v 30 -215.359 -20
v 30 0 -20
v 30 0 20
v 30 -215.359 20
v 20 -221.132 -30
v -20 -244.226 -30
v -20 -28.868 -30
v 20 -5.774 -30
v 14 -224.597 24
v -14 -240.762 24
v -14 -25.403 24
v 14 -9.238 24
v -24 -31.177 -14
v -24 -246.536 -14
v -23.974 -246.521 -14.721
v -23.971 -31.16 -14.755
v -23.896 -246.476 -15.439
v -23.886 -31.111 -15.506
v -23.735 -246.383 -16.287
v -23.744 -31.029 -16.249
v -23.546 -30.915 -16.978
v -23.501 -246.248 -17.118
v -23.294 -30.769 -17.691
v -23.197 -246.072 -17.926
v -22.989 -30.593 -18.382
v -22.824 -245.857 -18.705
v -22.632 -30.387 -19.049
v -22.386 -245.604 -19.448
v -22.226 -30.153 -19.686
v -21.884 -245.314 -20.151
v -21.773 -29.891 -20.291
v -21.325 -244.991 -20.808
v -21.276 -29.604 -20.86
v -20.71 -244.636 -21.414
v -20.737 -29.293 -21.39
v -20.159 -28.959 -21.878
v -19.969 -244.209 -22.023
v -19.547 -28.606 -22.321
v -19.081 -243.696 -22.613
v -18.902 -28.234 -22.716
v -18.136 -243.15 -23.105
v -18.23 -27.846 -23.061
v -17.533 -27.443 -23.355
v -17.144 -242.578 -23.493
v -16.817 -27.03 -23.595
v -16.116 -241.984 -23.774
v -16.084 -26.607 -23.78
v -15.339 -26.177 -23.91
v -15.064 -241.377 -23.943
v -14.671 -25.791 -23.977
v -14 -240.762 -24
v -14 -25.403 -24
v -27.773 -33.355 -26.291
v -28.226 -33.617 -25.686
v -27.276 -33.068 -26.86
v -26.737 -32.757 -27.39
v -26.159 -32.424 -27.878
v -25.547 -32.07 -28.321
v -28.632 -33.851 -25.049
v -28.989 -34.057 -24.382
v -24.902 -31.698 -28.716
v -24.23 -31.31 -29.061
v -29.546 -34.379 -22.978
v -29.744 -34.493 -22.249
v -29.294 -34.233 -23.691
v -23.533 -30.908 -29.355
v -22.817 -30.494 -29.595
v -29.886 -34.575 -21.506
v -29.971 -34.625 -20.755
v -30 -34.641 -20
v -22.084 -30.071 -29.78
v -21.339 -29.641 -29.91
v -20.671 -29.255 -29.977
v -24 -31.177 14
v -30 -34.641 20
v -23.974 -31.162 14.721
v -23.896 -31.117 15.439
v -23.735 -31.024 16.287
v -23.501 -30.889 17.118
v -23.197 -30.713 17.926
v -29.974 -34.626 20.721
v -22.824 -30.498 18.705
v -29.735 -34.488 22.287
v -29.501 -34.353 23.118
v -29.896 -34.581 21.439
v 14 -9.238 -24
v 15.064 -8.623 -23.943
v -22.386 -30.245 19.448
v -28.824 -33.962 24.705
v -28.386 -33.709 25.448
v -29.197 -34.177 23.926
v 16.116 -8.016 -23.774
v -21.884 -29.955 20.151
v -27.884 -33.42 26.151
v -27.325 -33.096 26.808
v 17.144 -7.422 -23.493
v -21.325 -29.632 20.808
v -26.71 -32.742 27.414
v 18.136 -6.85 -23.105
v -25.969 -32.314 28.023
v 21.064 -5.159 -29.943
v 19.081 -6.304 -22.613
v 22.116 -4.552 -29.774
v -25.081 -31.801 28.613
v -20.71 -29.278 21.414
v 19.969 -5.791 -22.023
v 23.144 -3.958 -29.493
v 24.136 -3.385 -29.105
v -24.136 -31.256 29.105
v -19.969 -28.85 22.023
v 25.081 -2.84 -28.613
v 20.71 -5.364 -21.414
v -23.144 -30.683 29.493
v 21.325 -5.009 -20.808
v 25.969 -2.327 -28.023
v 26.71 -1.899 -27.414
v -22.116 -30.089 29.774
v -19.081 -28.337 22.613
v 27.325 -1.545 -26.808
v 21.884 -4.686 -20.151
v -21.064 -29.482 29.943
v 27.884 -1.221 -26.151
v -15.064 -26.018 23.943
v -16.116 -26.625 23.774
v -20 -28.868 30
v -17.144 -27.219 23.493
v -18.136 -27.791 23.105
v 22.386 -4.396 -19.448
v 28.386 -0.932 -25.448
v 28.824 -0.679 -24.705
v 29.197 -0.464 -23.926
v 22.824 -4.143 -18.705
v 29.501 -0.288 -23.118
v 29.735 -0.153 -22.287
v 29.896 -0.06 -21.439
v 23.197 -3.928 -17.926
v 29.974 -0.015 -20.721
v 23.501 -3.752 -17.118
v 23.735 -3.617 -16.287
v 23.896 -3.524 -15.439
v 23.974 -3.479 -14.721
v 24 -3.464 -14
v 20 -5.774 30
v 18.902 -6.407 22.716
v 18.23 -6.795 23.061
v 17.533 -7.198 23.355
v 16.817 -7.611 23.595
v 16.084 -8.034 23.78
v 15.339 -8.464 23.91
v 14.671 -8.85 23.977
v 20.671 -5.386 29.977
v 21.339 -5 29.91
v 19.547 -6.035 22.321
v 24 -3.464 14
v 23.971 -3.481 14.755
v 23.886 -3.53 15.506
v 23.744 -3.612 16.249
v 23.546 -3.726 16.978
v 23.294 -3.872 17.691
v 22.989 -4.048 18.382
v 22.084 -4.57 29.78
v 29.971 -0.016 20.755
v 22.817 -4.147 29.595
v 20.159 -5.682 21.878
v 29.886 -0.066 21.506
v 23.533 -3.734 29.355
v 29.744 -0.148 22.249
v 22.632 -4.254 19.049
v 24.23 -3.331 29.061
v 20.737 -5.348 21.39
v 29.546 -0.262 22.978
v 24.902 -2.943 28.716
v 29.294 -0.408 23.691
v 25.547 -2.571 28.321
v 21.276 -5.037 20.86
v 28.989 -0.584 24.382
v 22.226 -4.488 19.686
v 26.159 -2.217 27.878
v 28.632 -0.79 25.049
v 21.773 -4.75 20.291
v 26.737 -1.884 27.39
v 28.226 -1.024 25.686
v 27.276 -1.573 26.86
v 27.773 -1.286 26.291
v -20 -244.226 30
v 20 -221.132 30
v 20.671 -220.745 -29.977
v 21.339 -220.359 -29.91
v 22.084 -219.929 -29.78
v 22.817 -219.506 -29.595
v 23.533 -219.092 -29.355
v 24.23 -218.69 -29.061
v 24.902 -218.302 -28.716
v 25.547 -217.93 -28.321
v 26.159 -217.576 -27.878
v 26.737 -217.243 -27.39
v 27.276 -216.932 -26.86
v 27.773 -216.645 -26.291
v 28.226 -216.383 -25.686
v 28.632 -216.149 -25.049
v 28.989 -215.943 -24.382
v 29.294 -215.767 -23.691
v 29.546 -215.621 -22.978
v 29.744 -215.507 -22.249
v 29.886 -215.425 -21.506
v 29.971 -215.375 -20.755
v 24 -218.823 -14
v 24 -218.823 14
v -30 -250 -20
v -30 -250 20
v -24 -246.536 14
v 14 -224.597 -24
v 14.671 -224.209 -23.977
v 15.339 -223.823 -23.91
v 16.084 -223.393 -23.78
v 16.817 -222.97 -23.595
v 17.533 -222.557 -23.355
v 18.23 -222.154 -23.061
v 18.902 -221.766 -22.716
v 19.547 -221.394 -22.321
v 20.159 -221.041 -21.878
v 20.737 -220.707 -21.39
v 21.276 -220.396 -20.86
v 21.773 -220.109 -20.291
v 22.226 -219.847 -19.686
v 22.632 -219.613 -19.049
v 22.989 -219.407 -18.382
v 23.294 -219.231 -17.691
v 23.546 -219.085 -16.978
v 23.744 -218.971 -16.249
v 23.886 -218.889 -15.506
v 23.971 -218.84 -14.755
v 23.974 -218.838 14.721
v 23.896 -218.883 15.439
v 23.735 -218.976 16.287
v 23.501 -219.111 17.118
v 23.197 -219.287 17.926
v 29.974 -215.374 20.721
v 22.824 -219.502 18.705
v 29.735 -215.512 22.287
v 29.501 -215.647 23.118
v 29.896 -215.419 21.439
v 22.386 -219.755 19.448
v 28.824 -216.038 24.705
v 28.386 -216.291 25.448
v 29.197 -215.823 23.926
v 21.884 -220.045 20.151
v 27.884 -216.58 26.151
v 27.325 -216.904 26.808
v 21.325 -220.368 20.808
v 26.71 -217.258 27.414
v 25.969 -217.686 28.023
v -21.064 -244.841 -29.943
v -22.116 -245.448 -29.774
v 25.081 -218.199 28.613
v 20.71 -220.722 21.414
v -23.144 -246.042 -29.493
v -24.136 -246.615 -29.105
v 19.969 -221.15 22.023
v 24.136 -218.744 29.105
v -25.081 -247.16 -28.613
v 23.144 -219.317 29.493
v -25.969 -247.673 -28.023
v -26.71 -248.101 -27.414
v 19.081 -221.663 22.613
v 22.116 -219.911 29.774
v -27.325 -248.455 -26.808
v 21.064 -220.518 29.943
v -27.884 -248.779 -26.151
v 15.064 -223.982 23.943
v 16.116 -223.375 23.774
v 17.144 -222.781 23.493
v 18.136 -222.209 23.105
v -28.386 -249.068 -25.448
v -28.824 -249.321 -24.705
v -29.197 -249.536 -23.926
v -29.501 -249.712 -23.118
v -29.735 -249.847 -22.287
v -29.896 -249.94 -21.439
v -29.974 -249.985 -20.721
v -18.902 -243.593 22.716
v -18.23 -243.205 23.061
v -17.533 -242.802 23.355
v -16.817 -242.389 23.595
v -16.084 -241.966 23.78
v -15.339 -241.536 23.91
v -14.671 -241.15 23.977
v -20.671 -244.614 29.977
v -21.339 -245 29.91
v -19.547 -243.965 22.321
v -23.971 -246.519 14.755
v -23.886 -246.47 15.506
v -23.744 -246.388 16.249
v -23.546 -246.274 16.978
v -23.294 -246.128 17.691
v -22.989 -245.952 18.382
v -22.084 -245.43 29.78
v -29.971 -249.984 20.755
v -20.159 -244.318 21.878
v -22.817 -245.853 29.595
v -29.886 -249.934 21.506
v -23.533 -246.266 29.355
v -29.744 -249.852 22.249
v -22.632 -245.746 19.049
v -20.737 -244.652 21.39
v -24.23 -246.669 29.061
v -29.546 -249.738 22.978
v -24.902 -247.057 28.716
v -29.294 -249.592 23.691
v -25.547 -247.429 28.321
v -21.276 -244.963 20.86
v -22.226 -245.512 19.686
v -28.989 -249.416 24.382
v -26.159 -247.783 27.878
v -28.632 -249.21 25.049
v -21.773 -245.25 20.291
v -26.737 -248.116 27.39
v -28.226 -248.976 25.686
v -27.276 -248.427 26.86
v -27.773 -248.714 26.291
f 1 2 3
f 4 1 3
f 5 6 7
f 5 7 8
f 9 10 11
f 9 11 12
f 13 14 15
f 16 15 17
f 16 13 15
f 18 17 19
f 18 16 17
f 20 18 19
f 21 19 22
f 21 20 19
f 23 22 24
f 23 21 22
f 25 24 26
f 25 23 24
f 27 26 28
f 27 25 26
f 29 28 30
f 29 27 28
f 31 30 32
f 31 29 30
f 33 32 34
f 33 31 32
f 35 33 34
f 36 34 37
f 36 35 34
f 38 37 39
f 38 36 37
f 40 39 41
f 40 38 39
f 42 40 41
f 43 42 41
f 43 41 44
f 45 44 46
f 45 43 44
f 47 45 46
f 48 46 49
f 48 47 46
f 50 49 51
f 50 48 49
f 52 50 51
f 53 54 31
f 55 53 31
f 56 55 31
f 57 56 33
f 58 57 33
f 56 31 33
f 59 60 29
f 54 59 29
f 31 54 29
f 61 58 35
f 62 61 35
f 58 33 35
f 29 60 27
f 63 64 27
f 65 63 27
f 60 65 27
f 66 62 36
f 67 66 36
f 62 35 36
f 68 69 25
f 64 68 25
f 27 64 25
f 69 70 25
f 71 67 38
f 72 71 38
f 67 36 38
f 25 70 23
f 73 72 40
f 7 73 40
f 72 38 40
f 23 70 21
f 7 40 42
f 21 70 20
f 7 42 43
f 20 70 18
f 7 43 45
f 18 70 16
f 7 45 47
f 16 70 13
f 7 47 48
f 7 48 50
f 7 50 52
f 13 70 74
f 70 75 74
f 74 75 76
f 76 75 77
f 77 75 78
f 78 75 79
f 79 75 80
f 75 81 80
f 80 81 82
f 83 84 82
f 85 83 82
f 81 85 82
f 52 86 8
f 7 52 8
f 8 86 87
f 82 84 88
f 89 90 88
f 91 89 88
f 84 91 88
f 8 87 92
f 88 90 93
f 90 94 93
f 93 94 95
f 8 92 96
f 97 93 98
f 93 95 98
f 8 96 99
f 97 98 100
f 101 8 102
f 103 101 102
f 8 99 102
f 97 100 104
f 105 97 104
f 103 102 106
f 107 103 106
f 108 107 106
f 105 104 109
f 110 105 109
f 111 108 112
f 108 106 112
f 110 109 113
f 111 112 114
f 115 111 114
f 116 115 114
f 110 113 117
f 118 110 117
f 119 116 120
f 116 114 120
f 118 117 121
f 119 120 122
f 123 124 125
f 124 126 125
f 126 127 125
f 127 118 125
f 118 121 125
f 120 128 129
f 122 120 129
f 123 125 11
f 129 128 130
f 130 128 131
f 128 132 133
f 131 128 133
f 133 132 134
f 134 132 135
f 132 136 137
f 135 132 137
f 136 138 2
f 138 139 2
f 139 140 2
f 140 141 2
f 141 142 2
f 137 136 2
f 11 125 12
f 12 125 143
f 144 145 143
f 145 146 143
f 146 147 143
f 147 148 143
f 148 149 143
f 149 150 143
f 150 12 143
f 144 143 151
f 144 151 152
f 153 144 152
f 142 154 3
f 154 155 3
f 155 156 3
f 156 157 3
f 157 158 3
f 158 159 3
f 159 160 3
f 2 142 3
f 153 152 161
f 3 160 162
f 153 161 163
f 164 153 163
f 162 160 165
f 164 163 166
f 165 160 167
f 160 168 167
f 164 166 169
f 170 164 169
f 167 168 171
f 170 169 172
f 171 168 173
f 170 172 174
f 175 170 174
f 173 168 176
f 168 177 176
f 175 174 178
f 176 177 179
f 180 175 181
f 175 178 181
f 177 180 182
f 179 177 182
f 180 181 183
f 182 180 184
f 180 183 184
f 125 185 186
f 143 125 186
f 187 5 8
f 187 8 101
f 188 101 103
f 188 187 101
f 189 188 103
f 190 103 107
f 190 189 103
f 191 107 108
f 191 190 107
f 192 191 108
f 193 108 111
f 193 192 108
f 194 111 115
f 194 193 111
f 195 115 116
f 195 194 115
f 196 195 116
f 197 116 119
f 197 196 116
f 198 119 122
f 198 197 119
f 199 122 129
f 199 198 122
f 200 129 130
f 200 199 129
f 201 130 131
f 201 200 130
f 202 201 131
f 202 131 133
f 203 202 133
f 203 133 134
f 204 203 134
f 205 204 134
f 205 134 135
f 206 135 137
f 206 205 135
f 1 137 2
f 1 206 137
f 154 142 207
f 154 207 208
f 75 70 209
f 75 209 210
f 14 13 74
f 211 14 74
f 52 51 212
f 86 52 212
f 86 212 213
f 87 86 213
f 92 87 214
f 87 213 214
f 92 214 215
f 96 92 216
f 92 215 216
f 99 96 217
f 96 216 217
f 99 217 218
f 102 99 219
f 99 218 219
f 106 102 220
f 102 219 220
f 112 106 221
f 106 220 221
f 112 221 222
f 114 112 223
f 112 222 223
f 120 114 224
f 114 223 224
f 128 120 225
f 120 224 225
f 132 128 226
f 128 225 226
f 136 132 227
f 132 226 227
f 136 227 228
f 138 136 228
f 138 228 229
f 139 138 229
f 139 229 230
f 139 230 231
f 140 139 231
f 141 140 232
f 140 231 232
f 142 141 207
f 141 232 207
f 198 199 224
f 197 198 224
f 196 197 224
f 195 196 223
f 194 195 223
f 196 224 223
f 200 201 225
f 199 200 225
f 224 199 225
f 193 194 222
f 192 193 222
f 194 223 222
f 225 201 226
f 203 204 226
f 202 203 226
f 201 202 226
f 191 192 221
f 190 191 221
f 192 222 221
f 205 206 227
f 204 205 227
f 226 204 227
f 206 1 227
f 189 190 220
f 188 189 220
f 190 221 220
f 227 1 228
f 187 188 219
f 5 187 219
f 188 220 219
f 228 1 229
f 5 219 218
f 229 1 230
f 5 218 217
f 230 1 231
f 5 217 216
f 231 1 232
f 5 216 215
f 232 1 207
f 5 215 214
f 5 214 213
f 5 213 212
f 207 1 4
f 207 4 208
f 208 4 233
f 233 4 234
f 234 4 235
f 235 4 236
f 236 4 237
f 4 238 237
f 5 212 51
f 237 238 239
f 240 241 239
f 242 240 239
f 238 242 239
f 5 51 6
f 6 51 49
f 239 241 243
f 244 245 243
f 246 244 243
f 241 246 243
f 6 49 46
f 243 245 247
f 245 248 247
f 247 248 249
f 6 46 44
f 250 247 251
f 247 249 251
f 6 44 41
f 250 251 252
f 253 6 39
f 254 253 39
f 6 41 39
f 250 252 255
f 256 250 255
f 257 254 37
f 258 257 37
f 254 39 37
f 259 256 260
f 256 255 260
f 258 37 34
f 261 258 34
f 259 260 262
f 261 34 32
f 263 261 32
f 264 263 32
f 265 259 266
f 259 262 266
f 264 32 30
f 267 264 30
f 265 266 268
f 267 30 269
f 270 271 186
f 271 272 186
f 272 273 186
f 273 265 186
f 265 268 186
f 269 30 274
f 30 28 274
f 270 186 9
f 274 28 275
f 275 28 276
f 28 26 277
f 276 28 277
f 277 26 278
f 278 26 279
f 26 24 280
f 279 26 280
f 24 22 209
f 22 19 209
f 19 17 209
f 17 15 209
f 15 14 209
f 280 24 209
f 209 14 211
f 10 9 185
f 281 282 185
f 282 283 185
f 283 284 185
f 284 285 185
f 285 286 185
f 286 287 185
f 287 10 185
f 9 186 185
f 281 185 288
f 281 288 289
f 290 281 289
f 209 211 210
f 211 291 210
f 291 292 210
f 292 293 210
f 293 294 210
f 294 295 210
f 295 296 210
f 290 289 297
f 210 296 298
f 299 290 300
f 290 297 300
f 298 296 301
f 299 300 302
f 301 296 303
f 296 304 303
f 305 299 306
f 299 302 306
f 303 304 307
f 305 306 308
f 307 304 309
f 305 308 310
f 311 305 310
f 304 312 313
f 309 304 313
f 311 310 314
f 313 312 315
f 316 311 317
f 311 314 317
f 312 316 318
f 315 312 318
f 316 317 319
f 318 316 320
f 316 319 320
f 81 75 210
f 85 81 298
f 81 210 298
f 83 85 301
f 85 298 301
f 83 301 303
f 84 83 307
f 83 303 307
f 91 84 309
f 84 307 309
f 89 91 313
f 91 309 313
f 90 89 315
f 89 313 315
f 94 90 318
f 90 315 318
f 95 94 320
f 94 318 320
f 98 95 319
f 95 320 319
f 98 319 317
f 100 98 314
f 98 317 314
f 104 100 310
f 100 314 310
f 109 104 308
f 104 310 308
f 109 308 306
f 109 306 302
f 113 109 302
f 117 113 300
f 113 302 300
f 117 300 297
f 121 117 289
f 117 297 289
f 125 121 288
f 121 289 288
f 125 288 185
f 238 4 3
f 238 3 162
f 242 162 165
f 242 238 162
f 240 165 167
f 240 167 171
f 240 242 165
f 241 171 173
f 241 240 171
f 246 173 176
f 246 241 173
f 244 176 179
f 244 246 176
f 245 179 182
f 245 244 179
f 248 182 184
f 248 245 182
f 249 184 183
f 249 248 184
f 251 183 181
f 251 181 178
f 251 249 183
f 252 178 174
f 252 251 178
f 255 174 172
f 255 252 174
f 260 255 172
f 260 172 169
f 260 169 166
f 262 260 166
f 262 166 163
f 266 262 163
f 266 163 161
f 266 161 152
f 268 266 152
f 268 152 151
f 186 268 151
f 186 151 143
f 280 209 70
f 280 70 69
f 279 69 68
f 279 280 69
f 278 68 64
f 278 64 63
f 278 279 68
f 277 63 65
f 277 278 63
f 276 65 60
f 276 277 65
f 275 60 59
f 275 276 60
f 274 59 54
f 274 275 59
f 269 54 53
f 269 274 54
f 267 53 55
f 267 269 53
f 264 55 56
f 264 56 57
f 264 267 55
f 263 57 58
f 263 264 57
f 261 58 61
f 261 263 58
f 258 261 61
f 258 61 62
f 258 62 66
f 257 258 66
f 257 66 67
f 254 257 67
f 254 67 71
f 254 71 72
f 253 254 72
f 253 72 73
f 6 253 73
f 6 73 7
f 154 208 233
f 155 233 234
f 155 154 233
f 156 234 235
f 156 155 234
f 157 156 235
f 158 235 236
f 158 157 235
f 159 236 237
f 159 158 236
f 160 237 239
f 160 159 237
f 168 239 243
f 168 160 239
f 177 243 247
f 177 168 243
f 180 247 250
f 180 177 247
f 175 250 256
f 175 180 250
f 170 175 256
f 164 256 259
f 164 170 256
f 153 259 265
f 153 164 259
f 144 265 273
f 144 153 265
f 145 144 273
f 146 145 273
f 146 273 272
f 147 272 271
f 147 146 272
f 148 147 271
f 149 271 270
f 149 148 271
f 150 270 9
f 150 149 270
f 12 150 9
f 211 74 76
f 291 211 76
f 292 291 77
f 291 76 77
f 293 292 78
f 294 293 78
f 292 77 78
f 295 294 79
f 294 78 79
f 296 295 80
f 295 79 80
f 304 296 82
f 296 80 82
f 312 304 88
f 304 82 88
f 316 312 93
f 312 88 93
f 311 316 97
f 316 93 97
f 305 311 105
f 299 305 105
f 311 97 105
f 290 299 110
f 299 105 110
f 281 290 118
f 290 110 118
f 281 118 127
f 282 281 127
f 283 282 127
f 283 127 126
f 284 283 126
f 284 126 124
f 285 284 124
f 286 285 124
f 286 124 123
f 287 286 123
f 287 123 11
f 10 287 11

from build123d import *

# Parameters (mm, degrees)
F0_W     = 60
F0_H     = 60
F1_DEPTH = 250
F2_T     = -6
F3_R     = 10
F5_DEPTH = 60.001
F7_DEPTH = 60.001


with BuildPart() as f1:
    # F0 (on Front) → F1 (new body)
    with BuildSketch(Plane.XZ):
        Rectangle(F0_W, F0_H)
    extrude(amount=F1_DEPTH)

    # F2
    f2_openings = [f1.faces().sort_by_distance(p)[0] for p in [
        (0, -250, 0),
        (0, 0, 0),
    ]]
    offset(amount=F2_T, openings=f2_openings)

    # F3
    f3_edges = [f1.edges().sort_by_distance(p)[0] for p in [
        (-30, -125, 30),
        (-24, -125, -24),
        (30, -125, 30),
        (30, -125, -30),
        (-24, -125, 24),
        (-30, -125, -30),
        (24, -125, 24),
        (24, -125, -24),
    ]]
    fillet(f3_edges, radius=F3_R)

    # F4 (on face) → F5 (cut, through all)
    with BuildSketch(Plane.XY.offset(30)):
        Polygon((40, -255.7735026919), (40, -209.5854811567), (-40, -255.7735026919), align=None)
    extrude(amount=-F5_DEPTH, mode=Mode.SUBTRACT)

    # F6 (on face) → F7 (cut, through all)
    with BuildSketch(Plane.XY.offset(30)):
        Polygon((-40, 5.7735026919), (-40, -40.4145188433), (40, 5.7735026919), align=None)
    extrude(amount=-F7_DEPTH, mode=Mode.SUBTRACT)


solid = f1.part
